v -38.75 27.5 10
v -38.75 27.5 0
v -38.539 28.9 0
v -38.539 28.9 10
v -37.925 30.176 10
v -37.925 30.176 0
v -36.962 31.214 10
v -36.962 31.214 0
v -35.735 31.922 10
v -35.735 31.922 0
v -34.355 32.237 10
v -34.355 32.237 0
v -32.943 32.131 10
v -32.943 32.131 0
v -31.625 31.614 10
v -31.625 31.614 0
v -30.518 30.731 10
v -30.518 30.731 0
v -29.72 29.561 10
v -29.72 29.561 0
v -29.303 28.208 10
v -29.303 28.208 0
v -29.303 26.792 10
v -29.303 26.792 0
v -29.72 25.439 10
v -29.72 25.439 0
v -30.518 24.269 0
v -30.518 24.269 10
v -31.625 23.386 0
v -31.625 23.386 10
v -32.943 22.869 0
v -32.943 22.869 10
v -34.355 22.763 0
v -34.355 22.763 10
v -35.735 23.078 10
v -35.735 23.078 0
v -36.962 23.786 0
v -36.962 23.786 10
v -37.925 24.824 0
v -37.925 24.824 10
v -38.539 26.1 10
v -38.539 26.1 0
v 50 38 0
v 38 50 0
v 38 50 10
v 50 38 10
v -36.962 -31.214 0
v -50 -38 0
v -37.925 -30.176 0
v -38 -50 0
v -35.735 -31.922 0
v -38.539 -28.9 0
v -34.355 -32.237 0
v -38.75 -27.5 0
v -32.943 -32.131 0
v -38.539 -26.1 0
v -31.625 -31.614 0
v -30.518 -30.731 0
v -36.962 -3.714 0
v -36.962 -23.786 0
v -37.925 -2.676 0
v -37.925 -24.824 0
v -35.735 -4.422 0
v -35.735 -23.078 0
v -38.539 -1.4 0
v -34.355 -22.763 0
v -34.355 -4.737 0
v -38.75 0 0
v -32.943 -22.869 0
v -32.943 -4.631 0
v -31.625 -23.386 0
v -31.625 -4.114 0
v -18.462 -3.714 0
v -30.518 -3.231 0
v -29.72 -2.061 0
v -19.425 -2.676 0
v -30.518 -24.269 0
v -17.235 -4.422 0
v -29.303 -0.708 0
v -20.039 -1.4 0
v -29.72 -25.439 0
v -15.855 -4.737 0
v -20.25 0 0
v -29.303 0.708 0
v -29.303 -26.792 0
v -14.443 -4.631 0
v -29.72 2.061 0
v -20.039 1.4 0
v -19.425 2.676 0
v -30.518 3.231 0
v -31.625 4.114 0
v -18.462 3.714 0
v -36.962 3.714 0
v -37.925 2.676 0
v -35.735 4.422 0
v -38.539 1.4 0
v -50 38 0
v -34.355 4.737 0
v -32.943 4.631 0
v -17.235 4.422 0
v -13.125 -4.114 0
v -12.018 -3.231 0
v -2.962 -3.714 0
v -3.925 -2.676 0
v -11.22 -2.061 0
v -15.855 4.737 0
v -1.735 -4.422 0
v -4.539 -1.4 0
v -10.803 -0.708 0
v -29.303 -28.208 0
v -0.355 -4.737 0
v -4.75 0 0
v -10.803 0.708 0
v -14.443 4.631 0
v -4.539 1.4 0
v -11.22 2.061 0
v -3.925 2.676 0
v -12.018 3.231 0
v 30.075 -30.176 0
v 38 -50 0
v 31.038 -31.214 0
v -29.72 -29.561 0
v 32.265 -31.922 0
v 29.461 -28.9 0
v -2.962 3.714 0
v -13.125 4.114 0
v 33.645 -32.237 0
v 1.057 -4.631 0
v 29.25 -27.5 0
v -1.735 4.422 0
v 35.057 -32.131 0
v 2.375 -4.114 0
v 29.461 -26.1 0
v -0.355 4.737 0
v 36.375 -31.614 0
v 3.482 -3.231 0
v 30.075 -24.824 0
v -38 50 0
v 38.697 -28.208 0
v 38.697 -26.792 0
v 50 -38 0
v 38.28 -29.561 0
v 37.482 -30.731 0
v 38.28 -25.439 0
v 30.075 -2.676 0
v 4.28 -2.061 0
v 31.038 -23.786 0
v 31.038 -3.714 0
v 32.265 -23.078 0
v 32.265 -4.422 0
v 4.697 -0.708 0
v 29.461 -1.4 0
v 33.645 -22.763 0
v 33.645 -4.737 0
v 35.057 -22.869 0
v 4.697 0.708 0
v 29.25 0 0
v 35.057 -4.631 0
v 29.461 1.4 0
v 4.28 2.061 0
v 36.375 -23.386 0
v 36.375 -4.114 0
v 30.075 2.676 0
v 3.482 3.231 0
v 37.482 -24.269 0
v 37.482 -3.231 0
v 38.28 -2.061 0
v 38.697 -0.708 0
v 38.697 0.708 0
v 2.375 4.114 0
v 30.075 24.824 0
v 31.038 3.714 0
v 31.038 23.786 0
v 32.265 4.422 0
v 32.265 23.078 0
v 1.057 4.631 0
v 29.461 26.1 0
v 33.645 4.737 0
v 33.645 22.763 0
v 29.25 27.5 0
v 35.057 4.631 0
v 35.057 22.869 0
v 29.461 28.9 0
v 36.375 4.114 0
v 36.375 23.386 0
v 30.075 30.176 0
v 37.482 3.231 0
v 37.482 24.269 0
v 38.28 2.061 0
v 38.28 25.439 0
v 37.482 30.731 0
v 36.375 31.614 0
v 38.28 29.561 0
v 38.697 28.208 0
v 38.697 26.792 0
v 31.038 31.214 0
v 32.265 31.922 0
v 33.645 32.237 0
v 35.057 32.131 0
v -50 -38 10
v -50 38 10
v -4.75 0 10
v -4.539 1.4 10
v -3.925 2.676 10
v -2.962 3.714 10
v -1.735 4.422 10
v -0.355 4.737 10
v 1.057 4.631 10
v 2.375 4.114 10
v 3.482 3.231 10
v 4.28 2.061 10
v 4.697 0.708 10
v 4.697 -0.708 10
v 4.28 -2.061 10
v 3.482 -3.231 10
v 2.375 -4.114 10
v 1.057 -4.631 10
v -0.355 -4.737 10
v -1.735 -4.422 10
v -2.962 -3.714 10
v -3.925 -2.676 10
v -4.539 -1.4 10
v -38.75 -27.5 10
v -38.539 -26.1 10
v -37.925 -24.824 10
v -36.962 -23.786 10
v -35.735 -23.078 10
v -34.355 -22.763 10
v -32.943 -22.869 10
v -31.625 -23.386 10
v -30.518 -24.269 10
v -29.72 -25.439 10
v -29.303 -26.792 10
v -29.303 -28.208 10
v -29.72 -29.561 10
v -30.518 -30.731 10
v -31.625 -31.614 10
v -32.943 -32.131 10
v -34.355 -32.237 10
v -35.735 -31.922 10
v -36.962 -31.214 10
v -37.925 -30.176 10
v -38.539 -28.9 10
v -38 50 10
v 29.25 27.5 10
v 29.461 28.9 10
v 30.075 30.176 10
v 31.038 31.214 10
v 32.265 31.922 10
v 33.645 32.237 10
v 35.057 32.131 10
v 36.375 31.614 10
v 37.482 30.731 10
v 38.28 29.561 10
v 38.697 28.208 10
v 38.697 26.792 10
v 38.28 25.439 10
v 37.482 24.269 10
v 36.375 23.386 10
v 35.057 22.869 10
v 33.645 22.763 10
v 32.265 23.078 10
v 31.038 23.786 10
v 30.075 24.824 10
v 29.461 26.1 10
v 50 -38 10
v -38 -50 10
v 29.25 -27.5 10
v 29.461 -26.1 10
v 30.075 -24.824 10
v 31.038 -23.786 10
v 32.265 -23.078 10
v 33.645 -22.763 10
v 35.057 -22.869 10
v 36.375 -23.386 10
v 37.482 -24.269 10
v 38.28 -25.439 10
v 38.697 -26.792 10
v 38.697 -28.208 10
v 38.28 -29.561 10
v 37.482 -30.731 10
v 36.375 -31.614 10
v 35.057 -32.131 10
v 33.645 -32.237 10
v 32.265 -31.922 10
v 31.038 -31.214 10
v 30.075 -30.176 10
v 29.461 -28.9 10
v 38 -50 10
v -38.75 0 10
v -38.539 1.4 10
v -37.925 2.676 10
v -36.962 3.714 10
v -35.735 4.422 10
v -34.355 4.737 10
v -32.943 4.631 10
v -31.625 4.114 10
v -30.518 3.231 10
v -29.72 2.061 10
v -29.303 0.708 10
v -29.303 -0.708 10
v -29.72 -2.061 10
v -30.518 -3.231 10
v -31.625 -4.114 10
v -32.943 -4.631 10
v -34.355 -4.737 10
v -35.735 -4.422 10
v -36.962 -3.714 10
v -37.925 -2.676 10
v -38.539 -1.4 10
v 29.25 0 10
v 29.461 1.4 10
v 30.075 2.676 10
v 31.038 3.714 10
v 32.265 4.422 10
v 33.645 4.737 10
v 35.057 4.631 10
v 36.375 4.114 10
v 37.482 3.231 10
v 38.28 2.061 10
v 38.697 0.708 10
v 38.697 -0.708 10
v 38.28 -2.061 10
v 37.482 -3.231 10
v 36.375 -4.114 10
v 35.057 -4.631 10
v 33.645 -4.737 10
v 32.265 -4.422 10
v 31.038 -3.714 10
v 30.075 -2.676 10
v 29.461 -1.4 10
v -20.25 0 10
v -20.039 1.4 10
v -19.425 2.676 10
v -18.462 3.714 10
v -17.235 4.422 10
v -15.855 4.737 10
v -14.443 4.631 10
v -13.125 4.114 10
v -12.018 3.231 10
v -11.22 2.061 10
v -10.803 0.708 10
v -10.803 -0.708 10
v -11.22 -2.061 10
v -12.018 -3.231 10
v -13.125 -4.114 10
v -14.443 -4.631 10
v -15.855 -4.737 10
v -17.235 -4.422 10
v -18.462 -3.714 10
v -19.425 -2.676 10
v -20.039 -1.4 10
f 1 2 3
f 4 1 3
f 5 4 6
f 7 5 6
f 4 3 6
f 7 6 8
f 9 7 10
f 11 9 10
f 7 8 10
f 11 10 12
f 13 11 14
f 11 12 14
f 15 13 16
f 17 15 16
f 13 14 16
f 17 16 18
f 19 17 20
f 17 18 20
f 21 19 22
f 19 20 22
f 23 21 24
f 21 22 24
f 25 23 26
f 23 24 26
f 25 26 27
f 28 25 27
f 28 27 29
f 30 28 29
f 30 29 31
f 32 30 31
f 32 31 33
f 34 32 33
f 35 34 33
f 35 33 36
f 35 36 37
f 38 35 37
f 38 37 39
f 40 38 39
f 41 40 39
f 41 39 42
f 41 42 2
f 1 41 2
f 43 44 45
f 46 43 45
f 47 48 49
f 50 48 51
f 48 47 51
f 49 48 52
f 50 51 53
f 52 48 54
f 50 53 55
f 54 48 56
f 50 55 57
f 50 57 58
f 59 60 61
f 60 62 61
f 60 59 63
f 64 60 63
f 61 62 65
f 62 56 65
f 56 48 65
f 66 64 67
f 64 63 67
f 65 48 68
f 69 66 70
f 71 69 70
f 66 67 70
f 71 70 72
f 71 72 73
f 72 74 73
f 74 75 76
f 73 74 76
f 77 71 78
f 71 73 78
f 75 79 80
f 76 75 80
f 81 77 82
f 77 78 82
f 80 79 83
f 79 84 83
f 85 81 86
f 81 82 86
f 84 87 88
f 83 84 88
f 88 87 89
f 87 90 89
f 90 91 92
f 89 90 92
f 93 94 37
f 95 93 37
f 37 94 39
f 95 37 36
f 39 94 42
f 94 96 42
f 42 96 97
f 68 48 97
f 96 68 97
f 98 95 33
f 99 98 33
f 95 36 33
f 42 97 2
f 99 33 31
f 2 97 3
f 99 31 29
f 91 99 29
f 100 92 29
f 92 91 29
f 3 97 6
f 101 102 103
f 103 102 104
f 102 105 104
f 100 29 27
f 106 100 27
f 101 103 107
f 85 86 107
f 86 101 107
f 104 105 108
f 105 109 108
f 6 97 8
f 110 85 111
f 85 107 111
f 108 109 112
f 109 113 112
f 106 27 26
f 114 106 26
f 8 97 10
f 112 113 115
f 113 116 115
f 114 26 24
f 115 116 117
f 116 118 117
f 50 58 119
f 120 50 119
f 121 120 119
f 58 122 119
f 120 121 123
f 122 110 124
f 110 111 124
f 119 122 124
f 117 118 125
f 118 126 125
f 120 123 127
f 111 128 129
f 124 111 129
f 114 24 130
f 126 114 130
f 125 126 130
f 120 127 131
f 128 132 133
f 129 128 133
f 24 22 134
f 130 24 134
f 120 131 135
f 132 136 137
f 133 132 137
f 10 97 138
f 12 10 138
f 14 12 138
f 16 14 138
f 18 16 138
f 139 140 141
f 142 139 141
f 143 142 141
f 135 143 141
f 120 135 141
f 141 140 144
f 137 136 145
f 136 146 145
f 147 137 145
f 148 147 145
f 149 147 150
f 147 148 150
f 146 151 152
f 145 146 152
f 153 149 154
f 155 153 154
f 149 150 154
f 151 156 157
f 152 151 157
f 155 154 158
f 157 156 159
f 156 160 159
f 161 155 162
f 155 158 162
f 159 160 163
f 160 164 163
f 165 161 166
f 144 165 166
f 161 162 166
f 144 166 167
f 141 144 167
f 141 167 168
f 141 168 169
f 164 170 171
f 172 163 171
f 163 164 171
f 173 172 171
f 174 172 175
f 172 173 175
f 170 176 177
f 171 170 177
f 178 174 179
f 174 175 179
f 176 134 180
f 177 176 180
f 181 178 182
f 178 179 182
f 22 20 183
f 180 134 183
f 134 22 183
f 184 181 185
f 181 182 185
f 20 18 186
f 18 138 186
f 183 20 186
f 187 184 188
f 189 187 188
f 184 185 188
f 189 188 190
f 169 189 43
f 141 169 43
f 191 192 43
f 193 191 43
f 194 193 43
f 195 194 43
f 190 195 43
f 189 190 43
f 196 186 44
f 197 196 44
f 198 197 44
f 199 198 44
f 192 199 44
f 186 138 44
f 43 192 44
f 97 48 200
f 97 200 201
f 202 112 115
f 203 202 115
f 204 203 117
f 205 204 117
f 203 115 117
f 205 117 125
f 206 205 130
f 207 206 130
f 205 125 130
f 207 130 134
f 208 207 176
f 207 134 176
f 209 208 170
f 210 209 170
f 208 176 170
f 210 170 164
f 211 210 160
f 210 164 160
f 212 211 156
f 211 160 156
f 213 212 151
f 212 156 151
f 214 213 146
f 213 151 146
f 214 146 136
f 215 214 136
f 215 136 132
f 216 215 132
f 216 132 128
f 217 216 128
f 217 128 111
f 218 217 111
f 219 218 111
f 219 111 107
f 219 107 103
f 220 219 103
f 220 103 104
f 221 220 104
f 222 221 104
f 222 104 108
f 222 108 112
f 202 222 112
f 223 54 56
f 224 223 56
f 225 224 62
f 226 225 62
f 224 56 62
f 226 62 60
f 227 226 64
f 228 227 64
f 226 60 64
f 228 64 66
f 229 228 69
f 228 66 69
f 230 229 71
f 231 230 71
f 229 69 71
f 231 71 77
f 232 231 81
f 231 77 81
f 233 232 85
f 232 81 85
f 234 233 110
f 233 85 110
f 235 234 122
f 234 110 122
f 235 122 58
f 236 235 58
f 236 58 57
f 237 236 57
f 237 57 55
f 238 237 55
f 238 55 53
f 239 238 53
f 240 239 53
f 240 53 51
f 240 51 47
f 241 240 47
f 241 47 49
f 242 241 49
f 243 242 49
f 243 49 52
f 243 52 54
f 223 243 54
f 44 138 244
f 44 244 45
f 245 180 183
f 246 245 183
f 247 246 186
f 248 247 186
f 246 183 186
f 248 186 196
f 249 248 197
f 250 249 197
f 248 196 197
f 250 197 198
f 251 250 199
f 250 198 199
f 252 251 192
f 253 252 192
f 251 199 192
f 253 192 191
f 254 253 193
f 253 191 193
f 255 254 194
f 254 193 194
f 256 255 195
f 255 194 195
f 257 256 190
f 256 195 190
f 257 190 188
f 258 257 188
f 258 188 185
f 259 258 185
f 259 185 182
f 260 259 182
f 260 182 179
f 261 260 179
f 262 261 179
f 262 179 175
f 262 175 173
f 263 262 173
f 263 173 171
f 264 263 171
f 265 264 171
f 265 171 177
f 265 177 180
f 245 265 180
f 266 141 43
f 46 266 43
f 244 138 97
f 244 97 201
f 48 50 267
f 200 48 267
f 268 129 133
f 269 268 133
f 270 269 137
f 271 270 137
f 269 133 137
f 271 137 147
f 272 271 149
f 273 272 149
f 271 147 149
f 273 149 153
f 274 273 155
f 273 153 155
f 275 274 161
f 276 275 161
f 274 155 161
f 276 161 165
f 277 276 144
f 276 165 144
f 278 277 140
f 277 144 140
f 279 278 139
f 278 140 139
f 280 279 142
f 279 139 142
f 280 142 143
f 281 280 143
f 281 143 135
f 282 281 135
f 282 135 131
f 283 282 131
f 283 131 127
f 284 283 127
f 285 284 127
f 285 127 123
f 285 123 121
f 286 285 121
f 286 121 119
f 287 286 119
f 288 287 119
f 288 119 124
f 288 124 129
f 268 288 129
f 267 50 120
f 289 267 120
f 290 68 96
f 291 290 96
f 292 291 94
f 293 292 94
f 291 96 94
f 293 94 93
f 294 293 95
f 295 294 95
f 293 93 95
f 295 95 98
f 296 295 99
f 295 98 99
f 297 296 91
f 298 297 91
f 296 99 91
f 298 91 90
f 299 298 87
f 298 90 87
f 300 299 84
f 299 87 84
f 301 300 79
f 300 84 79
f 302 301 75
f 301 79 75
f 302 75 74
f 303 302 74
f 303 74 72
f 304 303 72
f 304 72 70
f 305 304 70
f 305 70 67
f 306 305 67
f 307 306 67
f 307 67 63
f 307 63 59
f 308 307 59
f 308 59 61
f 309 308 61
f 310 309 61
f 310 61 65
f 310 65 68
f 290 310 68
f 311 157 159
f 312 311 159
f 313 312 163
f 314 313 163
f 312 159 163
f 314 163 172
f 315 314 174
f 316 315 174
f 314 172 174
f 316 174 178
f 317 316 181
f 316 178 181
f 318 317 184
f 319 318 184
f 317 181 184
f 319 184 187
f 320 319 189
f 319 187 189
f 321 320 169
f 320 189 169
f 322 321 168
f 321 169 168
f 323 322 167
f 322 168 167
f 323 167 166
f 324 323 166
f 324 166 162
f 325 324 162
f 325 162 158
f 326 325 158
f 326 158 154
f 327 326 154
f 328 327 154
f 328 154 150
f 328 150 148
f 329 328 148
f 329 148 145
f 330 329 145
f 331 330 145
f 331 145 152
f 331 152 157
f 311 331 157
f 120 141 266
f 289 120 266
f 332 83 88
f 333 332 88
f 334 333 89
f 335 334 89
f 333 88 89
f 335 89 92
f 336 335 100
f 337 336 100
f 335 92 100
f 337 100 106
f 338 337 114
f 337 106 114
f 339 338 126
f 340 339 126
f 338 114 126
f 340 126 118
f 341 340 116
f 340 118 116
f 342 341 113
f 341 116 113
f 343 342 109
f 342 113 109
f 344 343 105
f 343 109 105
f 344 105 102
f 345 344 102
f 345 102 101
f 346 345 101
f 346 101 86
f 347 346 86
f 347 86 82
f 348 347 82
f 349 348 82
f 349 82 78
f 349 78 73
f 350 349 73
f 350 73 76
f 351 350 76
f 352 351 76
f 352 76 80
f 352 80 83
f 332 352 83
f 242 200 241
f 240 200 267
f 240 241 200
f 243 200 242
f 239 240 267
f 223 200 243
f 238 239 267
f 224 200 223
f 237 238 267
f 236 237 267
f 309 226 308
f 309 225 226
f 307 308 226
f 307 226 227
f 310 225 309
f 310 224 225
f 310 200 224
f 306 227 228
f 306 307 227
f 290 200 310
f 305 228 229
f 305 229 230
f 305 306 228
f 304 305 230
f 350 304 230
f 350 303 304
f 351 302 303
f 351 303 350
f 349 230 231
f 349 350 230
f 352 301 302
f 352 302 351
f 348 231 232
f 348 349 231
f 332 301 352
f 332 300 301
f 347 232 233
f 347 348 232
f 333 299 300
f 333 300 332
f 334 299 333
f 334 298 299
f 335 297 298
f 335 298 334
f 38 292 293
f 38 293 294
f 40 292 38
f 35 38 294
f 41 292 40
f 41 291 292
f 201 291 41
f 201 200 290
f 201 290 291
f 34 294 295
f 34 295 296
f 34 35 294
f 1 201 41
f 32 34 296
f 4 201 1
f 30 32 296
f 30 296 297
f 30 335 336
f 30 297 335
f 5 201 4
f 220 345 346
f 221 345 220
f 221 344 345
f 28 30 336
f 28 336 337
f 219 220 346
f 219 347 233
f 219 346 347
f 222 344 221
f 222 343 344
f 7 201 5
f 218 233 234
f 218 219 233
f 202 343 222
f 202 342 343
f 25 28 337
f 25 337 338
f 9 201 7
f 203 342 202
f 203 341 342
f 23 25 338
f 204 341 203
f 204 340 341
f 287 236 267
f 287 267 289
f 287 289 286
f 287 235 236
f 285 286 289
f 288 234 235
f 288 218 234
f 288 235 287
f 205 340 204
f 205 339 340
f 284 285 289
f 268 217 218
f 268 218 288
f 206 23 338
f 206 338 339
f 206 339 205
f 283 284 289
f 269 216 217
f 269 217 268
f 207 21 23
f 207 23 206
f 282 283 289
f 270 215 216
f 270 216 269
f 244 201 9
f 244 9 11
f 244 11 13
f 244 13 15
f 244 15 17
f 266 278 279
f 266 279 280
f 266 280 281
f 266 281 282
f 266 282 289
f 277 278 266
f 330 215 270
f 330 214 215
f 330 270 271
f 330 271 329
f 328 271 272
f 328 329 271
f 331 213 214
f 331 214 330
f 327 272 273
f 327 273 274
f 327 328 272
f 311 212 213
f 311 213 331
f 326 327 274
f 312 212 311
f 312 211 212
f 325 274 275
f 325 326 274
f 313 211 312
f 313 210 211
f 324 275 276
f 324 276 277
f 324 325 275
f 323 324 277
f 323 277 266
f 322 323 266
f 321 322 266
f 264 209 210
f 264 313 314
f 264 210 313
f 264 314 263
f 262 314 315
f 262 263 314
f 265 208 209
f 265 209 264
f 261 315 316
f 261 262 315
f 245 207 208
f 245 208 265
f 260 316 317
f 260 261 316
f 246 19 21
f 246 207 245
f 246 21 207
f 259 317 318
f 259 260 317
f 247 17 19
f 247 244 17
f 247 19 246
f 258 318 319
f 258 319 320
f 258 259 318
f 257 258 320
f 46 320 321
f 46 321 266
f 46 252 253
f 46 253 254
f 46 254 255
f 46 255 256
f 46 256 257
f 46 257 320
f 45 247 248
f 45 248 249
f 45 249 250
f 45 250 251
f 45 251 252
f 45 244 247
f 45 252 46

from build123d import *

# Parameters (mm, degrees)
F0_W     = 100
F0_H     = 100
F1_DEPTH = 10
F2_SIZE  = 12
F4_D     = 9.5


with BuildPart() as f1:
    # F0 (on Top) → F1 (new body)
    with BuildSketch(Plane.XY):
        Rectangle(F0_W, F0_H)
    extrude(amount=F1_DEPTH)

    # F2
    f2_edges = [f1.edges().sort_by_distance(p)[0] for p in [
        (50, -50, 5),
        (50, 50, 5),
        (-50, -50, 5),
        (-50, 50, 5),
    ]]
    chamfer(f2_edges, length=F2_SIZE)

    # F4 (through all)
    with Locations(Plane.XY.offset(10)):
        with Locations((-15.5, 0), (-34, 0), (-34, -27.5), (-34, 27.5), (34, 27.5), (34, 0), (34, -27.5), (0, 0)):
            Hole(F4_D / 2)


solid = f1.part
